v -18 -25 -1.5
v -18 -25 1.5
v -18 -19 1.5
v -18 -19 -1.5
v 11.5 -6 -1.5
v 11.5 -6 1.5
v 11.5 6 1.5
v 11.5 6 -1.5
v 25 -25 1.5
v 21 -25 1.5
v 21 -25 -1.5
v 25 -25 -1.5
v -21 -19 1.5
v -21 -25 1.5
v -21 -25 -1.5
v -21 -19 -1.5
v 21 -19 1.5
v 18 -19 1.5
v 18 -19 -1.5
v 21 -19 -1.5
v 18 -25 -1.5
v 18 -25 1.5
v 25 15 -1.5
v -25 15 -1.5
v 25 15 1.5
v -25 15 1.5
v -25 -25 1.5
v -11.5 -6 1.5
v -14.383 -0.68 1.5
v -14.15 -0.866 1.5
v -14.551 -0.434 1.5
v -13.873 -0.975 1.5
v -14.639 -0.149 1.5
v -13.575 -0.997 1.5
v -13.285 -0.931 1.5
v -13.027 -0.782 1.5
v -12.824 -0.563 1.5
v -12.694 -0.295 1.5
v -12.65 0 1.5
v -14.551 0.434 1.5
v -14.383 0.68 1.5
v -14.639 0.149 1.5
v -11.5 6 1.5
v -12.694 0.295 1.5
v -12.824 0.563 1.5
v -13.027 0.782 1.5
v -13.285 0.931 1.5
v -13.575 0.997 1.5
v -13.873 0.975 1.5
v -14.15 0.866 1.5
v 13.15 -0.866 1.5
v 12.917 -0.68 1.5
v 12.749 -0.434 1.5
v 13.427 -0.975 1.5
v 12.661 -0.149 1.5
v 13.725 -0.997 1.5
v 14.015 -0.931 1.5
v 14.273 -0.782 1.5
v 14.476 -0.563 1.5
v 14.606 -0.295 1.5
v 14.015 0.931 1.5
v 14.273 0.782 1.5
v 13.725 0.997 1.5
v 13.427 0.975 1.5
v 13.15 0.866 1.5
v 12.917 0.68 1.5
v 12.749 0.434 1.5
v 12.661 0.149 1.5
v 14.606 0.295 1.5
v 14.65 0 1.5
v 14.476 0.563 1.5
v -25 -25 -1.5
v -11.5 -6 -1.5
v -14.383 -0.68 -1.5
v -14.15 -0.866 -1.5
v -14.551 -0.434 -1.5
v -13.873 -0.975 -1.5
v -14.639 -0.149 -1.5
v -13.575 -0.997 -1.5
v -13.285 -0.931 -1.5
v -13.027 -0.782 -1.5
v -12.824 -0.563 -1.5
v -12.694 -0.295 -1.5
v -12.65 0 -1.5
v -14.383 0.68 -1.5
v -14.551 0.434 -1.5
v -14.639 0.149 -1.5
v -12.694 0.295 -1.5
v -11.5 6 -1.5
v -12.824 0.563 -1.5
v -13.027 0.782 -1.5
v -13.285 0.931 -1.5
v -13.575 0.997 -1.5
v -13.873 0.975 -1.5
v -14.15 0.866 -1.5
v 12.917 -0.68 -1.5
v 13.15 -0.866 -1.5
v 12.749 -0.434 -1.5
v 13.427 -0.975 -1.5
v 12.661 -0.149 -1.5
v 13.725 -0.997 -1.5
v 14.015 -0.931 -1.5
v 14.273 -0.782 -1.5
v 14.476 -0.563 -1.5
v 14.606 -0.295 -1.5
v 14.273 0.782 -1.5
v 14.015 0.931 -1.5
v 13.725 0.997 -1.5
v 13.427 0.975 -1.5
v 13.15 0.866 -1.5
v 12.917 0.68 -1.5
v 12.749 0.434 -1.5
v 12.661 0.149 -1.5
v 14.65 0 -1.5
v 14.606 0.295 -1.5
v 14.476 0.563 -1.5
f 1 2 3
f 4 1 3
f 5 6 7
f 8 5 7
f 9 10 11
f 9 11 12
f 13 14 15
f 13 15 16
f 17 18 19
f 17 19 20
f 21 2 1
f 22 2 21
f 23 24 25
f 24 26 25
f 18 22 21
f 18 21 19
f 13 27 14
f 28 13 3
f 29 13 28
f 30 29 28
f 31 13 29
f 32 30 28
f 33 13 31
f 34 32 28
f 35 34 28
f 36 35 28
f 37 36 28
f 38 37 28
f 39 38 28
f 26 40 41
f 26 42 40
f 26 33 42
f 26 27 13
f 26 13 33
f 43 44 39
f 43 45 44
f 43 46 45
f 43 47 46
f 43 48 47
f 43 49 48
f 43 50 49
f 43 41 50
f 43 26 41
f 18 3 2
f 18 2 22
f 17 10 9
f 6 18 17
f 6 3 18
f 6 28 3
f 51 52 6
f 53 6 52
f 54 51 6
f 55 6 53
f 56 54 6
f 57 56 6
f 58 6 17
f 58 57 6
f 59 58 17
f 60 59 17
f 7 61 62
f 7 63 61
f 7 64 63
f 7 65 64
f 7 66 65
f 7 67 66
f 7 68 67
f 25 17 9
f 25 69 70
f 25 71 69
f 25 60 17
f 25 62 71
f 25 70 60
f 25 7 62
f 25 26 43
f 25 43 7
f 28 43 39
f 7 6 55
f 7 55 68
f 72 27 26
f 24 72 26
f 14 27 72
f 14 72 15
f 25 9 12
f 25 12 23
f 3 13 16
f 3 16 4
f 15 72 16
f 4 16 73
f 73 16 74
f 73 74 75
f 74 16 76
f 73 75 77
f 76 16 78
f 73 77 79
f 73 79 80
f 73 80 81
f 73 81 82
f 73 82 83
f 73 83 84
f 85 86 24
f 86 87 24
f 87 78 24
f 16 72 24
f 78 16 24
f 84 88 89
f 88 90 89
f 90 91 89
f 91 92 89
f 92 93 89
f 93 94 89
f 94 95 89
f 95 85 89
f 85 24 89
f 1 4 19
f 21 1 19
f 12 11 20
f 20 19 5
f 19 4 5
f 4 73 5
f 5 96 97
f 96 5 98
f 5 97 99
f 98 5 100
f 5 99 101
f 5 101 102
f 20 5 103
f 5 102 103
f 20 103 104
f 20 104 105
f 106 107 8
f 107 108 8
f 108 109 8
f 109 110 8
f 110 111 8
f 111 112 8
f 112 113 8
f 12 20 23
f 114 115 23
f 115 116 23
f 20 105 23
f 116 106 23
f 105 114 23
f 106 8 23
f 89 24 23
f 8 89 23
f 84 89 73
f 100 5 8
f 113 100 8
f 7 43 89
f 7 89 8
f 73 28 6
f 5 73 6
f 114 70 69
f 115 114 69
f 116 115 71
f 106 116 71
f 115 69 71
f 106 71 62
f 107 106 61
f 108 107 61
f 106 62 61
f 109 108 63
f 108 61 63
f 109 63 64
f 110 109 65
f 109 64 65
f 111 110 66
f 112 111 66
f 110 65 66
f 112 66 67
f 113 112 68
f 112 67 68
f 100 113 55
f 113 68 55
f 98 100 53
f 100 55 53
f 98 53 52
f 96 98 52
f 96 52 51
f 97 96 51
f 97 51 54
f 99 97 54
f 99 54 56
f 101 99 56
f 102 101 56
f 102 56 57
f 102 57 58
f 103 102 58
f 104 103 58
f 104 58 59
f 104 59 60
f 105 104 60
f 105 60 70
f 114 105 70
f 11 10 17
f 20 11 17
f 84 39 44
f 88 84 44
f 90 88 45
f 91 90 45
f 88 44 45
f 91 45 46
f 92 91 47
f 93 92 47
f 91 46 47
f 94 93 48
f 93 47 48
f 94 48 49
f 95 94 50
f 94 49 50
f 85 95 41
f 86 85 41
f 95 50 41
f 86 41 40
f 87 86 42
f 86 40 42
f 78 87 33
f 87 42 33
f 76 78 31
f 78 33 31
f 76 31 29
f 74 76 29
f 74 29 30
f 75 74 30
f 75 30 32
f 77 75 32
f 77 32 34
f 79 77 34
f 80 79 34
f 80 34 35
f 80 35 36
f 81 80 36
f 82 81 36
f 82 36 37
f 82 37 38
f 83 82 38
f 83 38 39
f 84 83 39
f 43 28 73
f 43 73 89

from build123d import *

# Parameters (mm, degrees)
F0_W     = 50
F0_H     = 40
F1_DEPTH = 1.5
F2_W     = 23
F2_H     = 12
F2_R     = 1
F3_DEPTH = 25
F4_W     = 3
F4_H     = 6
F5_DEPTH = 25


with BuildPart() as f1:
    # F0 (on Top) → F1 (new body, symmetric)
    with BuildSketch(Plane.XY):
        with Locations((0, -5)):
            Rectangle(F0_W, F0_H)
    extrude(amount=F1_DEPTH, both=True)

    # F2 (on face) → F3 (cut)
    with BuildSketch(Plane.XY.offset(1.5)):
        Rectangle(F2_W, F2_H)
        with Locations((13.65, 0)):
            Circle(F2_R)
        with Locations((-13.65, 0)):
            Circle(F2_R)
    extrude(amount=-F3_DEPTH, mode=Mode.SUBTRACT)

    # F4 (on face) → F5 (cut)
    with BuildSketch(Plane.XY.offset(1.5)):
        with Locations((-19.5, -22)):
            Rectangle(F4_W, F4_H)
        with Locations((19.5, -22)):
            Rectangle(F4_W, F4_H)
    extrude(amount=-F5_DEPTH, mode=Mode.SUBTRACT)


solid = f1.part
